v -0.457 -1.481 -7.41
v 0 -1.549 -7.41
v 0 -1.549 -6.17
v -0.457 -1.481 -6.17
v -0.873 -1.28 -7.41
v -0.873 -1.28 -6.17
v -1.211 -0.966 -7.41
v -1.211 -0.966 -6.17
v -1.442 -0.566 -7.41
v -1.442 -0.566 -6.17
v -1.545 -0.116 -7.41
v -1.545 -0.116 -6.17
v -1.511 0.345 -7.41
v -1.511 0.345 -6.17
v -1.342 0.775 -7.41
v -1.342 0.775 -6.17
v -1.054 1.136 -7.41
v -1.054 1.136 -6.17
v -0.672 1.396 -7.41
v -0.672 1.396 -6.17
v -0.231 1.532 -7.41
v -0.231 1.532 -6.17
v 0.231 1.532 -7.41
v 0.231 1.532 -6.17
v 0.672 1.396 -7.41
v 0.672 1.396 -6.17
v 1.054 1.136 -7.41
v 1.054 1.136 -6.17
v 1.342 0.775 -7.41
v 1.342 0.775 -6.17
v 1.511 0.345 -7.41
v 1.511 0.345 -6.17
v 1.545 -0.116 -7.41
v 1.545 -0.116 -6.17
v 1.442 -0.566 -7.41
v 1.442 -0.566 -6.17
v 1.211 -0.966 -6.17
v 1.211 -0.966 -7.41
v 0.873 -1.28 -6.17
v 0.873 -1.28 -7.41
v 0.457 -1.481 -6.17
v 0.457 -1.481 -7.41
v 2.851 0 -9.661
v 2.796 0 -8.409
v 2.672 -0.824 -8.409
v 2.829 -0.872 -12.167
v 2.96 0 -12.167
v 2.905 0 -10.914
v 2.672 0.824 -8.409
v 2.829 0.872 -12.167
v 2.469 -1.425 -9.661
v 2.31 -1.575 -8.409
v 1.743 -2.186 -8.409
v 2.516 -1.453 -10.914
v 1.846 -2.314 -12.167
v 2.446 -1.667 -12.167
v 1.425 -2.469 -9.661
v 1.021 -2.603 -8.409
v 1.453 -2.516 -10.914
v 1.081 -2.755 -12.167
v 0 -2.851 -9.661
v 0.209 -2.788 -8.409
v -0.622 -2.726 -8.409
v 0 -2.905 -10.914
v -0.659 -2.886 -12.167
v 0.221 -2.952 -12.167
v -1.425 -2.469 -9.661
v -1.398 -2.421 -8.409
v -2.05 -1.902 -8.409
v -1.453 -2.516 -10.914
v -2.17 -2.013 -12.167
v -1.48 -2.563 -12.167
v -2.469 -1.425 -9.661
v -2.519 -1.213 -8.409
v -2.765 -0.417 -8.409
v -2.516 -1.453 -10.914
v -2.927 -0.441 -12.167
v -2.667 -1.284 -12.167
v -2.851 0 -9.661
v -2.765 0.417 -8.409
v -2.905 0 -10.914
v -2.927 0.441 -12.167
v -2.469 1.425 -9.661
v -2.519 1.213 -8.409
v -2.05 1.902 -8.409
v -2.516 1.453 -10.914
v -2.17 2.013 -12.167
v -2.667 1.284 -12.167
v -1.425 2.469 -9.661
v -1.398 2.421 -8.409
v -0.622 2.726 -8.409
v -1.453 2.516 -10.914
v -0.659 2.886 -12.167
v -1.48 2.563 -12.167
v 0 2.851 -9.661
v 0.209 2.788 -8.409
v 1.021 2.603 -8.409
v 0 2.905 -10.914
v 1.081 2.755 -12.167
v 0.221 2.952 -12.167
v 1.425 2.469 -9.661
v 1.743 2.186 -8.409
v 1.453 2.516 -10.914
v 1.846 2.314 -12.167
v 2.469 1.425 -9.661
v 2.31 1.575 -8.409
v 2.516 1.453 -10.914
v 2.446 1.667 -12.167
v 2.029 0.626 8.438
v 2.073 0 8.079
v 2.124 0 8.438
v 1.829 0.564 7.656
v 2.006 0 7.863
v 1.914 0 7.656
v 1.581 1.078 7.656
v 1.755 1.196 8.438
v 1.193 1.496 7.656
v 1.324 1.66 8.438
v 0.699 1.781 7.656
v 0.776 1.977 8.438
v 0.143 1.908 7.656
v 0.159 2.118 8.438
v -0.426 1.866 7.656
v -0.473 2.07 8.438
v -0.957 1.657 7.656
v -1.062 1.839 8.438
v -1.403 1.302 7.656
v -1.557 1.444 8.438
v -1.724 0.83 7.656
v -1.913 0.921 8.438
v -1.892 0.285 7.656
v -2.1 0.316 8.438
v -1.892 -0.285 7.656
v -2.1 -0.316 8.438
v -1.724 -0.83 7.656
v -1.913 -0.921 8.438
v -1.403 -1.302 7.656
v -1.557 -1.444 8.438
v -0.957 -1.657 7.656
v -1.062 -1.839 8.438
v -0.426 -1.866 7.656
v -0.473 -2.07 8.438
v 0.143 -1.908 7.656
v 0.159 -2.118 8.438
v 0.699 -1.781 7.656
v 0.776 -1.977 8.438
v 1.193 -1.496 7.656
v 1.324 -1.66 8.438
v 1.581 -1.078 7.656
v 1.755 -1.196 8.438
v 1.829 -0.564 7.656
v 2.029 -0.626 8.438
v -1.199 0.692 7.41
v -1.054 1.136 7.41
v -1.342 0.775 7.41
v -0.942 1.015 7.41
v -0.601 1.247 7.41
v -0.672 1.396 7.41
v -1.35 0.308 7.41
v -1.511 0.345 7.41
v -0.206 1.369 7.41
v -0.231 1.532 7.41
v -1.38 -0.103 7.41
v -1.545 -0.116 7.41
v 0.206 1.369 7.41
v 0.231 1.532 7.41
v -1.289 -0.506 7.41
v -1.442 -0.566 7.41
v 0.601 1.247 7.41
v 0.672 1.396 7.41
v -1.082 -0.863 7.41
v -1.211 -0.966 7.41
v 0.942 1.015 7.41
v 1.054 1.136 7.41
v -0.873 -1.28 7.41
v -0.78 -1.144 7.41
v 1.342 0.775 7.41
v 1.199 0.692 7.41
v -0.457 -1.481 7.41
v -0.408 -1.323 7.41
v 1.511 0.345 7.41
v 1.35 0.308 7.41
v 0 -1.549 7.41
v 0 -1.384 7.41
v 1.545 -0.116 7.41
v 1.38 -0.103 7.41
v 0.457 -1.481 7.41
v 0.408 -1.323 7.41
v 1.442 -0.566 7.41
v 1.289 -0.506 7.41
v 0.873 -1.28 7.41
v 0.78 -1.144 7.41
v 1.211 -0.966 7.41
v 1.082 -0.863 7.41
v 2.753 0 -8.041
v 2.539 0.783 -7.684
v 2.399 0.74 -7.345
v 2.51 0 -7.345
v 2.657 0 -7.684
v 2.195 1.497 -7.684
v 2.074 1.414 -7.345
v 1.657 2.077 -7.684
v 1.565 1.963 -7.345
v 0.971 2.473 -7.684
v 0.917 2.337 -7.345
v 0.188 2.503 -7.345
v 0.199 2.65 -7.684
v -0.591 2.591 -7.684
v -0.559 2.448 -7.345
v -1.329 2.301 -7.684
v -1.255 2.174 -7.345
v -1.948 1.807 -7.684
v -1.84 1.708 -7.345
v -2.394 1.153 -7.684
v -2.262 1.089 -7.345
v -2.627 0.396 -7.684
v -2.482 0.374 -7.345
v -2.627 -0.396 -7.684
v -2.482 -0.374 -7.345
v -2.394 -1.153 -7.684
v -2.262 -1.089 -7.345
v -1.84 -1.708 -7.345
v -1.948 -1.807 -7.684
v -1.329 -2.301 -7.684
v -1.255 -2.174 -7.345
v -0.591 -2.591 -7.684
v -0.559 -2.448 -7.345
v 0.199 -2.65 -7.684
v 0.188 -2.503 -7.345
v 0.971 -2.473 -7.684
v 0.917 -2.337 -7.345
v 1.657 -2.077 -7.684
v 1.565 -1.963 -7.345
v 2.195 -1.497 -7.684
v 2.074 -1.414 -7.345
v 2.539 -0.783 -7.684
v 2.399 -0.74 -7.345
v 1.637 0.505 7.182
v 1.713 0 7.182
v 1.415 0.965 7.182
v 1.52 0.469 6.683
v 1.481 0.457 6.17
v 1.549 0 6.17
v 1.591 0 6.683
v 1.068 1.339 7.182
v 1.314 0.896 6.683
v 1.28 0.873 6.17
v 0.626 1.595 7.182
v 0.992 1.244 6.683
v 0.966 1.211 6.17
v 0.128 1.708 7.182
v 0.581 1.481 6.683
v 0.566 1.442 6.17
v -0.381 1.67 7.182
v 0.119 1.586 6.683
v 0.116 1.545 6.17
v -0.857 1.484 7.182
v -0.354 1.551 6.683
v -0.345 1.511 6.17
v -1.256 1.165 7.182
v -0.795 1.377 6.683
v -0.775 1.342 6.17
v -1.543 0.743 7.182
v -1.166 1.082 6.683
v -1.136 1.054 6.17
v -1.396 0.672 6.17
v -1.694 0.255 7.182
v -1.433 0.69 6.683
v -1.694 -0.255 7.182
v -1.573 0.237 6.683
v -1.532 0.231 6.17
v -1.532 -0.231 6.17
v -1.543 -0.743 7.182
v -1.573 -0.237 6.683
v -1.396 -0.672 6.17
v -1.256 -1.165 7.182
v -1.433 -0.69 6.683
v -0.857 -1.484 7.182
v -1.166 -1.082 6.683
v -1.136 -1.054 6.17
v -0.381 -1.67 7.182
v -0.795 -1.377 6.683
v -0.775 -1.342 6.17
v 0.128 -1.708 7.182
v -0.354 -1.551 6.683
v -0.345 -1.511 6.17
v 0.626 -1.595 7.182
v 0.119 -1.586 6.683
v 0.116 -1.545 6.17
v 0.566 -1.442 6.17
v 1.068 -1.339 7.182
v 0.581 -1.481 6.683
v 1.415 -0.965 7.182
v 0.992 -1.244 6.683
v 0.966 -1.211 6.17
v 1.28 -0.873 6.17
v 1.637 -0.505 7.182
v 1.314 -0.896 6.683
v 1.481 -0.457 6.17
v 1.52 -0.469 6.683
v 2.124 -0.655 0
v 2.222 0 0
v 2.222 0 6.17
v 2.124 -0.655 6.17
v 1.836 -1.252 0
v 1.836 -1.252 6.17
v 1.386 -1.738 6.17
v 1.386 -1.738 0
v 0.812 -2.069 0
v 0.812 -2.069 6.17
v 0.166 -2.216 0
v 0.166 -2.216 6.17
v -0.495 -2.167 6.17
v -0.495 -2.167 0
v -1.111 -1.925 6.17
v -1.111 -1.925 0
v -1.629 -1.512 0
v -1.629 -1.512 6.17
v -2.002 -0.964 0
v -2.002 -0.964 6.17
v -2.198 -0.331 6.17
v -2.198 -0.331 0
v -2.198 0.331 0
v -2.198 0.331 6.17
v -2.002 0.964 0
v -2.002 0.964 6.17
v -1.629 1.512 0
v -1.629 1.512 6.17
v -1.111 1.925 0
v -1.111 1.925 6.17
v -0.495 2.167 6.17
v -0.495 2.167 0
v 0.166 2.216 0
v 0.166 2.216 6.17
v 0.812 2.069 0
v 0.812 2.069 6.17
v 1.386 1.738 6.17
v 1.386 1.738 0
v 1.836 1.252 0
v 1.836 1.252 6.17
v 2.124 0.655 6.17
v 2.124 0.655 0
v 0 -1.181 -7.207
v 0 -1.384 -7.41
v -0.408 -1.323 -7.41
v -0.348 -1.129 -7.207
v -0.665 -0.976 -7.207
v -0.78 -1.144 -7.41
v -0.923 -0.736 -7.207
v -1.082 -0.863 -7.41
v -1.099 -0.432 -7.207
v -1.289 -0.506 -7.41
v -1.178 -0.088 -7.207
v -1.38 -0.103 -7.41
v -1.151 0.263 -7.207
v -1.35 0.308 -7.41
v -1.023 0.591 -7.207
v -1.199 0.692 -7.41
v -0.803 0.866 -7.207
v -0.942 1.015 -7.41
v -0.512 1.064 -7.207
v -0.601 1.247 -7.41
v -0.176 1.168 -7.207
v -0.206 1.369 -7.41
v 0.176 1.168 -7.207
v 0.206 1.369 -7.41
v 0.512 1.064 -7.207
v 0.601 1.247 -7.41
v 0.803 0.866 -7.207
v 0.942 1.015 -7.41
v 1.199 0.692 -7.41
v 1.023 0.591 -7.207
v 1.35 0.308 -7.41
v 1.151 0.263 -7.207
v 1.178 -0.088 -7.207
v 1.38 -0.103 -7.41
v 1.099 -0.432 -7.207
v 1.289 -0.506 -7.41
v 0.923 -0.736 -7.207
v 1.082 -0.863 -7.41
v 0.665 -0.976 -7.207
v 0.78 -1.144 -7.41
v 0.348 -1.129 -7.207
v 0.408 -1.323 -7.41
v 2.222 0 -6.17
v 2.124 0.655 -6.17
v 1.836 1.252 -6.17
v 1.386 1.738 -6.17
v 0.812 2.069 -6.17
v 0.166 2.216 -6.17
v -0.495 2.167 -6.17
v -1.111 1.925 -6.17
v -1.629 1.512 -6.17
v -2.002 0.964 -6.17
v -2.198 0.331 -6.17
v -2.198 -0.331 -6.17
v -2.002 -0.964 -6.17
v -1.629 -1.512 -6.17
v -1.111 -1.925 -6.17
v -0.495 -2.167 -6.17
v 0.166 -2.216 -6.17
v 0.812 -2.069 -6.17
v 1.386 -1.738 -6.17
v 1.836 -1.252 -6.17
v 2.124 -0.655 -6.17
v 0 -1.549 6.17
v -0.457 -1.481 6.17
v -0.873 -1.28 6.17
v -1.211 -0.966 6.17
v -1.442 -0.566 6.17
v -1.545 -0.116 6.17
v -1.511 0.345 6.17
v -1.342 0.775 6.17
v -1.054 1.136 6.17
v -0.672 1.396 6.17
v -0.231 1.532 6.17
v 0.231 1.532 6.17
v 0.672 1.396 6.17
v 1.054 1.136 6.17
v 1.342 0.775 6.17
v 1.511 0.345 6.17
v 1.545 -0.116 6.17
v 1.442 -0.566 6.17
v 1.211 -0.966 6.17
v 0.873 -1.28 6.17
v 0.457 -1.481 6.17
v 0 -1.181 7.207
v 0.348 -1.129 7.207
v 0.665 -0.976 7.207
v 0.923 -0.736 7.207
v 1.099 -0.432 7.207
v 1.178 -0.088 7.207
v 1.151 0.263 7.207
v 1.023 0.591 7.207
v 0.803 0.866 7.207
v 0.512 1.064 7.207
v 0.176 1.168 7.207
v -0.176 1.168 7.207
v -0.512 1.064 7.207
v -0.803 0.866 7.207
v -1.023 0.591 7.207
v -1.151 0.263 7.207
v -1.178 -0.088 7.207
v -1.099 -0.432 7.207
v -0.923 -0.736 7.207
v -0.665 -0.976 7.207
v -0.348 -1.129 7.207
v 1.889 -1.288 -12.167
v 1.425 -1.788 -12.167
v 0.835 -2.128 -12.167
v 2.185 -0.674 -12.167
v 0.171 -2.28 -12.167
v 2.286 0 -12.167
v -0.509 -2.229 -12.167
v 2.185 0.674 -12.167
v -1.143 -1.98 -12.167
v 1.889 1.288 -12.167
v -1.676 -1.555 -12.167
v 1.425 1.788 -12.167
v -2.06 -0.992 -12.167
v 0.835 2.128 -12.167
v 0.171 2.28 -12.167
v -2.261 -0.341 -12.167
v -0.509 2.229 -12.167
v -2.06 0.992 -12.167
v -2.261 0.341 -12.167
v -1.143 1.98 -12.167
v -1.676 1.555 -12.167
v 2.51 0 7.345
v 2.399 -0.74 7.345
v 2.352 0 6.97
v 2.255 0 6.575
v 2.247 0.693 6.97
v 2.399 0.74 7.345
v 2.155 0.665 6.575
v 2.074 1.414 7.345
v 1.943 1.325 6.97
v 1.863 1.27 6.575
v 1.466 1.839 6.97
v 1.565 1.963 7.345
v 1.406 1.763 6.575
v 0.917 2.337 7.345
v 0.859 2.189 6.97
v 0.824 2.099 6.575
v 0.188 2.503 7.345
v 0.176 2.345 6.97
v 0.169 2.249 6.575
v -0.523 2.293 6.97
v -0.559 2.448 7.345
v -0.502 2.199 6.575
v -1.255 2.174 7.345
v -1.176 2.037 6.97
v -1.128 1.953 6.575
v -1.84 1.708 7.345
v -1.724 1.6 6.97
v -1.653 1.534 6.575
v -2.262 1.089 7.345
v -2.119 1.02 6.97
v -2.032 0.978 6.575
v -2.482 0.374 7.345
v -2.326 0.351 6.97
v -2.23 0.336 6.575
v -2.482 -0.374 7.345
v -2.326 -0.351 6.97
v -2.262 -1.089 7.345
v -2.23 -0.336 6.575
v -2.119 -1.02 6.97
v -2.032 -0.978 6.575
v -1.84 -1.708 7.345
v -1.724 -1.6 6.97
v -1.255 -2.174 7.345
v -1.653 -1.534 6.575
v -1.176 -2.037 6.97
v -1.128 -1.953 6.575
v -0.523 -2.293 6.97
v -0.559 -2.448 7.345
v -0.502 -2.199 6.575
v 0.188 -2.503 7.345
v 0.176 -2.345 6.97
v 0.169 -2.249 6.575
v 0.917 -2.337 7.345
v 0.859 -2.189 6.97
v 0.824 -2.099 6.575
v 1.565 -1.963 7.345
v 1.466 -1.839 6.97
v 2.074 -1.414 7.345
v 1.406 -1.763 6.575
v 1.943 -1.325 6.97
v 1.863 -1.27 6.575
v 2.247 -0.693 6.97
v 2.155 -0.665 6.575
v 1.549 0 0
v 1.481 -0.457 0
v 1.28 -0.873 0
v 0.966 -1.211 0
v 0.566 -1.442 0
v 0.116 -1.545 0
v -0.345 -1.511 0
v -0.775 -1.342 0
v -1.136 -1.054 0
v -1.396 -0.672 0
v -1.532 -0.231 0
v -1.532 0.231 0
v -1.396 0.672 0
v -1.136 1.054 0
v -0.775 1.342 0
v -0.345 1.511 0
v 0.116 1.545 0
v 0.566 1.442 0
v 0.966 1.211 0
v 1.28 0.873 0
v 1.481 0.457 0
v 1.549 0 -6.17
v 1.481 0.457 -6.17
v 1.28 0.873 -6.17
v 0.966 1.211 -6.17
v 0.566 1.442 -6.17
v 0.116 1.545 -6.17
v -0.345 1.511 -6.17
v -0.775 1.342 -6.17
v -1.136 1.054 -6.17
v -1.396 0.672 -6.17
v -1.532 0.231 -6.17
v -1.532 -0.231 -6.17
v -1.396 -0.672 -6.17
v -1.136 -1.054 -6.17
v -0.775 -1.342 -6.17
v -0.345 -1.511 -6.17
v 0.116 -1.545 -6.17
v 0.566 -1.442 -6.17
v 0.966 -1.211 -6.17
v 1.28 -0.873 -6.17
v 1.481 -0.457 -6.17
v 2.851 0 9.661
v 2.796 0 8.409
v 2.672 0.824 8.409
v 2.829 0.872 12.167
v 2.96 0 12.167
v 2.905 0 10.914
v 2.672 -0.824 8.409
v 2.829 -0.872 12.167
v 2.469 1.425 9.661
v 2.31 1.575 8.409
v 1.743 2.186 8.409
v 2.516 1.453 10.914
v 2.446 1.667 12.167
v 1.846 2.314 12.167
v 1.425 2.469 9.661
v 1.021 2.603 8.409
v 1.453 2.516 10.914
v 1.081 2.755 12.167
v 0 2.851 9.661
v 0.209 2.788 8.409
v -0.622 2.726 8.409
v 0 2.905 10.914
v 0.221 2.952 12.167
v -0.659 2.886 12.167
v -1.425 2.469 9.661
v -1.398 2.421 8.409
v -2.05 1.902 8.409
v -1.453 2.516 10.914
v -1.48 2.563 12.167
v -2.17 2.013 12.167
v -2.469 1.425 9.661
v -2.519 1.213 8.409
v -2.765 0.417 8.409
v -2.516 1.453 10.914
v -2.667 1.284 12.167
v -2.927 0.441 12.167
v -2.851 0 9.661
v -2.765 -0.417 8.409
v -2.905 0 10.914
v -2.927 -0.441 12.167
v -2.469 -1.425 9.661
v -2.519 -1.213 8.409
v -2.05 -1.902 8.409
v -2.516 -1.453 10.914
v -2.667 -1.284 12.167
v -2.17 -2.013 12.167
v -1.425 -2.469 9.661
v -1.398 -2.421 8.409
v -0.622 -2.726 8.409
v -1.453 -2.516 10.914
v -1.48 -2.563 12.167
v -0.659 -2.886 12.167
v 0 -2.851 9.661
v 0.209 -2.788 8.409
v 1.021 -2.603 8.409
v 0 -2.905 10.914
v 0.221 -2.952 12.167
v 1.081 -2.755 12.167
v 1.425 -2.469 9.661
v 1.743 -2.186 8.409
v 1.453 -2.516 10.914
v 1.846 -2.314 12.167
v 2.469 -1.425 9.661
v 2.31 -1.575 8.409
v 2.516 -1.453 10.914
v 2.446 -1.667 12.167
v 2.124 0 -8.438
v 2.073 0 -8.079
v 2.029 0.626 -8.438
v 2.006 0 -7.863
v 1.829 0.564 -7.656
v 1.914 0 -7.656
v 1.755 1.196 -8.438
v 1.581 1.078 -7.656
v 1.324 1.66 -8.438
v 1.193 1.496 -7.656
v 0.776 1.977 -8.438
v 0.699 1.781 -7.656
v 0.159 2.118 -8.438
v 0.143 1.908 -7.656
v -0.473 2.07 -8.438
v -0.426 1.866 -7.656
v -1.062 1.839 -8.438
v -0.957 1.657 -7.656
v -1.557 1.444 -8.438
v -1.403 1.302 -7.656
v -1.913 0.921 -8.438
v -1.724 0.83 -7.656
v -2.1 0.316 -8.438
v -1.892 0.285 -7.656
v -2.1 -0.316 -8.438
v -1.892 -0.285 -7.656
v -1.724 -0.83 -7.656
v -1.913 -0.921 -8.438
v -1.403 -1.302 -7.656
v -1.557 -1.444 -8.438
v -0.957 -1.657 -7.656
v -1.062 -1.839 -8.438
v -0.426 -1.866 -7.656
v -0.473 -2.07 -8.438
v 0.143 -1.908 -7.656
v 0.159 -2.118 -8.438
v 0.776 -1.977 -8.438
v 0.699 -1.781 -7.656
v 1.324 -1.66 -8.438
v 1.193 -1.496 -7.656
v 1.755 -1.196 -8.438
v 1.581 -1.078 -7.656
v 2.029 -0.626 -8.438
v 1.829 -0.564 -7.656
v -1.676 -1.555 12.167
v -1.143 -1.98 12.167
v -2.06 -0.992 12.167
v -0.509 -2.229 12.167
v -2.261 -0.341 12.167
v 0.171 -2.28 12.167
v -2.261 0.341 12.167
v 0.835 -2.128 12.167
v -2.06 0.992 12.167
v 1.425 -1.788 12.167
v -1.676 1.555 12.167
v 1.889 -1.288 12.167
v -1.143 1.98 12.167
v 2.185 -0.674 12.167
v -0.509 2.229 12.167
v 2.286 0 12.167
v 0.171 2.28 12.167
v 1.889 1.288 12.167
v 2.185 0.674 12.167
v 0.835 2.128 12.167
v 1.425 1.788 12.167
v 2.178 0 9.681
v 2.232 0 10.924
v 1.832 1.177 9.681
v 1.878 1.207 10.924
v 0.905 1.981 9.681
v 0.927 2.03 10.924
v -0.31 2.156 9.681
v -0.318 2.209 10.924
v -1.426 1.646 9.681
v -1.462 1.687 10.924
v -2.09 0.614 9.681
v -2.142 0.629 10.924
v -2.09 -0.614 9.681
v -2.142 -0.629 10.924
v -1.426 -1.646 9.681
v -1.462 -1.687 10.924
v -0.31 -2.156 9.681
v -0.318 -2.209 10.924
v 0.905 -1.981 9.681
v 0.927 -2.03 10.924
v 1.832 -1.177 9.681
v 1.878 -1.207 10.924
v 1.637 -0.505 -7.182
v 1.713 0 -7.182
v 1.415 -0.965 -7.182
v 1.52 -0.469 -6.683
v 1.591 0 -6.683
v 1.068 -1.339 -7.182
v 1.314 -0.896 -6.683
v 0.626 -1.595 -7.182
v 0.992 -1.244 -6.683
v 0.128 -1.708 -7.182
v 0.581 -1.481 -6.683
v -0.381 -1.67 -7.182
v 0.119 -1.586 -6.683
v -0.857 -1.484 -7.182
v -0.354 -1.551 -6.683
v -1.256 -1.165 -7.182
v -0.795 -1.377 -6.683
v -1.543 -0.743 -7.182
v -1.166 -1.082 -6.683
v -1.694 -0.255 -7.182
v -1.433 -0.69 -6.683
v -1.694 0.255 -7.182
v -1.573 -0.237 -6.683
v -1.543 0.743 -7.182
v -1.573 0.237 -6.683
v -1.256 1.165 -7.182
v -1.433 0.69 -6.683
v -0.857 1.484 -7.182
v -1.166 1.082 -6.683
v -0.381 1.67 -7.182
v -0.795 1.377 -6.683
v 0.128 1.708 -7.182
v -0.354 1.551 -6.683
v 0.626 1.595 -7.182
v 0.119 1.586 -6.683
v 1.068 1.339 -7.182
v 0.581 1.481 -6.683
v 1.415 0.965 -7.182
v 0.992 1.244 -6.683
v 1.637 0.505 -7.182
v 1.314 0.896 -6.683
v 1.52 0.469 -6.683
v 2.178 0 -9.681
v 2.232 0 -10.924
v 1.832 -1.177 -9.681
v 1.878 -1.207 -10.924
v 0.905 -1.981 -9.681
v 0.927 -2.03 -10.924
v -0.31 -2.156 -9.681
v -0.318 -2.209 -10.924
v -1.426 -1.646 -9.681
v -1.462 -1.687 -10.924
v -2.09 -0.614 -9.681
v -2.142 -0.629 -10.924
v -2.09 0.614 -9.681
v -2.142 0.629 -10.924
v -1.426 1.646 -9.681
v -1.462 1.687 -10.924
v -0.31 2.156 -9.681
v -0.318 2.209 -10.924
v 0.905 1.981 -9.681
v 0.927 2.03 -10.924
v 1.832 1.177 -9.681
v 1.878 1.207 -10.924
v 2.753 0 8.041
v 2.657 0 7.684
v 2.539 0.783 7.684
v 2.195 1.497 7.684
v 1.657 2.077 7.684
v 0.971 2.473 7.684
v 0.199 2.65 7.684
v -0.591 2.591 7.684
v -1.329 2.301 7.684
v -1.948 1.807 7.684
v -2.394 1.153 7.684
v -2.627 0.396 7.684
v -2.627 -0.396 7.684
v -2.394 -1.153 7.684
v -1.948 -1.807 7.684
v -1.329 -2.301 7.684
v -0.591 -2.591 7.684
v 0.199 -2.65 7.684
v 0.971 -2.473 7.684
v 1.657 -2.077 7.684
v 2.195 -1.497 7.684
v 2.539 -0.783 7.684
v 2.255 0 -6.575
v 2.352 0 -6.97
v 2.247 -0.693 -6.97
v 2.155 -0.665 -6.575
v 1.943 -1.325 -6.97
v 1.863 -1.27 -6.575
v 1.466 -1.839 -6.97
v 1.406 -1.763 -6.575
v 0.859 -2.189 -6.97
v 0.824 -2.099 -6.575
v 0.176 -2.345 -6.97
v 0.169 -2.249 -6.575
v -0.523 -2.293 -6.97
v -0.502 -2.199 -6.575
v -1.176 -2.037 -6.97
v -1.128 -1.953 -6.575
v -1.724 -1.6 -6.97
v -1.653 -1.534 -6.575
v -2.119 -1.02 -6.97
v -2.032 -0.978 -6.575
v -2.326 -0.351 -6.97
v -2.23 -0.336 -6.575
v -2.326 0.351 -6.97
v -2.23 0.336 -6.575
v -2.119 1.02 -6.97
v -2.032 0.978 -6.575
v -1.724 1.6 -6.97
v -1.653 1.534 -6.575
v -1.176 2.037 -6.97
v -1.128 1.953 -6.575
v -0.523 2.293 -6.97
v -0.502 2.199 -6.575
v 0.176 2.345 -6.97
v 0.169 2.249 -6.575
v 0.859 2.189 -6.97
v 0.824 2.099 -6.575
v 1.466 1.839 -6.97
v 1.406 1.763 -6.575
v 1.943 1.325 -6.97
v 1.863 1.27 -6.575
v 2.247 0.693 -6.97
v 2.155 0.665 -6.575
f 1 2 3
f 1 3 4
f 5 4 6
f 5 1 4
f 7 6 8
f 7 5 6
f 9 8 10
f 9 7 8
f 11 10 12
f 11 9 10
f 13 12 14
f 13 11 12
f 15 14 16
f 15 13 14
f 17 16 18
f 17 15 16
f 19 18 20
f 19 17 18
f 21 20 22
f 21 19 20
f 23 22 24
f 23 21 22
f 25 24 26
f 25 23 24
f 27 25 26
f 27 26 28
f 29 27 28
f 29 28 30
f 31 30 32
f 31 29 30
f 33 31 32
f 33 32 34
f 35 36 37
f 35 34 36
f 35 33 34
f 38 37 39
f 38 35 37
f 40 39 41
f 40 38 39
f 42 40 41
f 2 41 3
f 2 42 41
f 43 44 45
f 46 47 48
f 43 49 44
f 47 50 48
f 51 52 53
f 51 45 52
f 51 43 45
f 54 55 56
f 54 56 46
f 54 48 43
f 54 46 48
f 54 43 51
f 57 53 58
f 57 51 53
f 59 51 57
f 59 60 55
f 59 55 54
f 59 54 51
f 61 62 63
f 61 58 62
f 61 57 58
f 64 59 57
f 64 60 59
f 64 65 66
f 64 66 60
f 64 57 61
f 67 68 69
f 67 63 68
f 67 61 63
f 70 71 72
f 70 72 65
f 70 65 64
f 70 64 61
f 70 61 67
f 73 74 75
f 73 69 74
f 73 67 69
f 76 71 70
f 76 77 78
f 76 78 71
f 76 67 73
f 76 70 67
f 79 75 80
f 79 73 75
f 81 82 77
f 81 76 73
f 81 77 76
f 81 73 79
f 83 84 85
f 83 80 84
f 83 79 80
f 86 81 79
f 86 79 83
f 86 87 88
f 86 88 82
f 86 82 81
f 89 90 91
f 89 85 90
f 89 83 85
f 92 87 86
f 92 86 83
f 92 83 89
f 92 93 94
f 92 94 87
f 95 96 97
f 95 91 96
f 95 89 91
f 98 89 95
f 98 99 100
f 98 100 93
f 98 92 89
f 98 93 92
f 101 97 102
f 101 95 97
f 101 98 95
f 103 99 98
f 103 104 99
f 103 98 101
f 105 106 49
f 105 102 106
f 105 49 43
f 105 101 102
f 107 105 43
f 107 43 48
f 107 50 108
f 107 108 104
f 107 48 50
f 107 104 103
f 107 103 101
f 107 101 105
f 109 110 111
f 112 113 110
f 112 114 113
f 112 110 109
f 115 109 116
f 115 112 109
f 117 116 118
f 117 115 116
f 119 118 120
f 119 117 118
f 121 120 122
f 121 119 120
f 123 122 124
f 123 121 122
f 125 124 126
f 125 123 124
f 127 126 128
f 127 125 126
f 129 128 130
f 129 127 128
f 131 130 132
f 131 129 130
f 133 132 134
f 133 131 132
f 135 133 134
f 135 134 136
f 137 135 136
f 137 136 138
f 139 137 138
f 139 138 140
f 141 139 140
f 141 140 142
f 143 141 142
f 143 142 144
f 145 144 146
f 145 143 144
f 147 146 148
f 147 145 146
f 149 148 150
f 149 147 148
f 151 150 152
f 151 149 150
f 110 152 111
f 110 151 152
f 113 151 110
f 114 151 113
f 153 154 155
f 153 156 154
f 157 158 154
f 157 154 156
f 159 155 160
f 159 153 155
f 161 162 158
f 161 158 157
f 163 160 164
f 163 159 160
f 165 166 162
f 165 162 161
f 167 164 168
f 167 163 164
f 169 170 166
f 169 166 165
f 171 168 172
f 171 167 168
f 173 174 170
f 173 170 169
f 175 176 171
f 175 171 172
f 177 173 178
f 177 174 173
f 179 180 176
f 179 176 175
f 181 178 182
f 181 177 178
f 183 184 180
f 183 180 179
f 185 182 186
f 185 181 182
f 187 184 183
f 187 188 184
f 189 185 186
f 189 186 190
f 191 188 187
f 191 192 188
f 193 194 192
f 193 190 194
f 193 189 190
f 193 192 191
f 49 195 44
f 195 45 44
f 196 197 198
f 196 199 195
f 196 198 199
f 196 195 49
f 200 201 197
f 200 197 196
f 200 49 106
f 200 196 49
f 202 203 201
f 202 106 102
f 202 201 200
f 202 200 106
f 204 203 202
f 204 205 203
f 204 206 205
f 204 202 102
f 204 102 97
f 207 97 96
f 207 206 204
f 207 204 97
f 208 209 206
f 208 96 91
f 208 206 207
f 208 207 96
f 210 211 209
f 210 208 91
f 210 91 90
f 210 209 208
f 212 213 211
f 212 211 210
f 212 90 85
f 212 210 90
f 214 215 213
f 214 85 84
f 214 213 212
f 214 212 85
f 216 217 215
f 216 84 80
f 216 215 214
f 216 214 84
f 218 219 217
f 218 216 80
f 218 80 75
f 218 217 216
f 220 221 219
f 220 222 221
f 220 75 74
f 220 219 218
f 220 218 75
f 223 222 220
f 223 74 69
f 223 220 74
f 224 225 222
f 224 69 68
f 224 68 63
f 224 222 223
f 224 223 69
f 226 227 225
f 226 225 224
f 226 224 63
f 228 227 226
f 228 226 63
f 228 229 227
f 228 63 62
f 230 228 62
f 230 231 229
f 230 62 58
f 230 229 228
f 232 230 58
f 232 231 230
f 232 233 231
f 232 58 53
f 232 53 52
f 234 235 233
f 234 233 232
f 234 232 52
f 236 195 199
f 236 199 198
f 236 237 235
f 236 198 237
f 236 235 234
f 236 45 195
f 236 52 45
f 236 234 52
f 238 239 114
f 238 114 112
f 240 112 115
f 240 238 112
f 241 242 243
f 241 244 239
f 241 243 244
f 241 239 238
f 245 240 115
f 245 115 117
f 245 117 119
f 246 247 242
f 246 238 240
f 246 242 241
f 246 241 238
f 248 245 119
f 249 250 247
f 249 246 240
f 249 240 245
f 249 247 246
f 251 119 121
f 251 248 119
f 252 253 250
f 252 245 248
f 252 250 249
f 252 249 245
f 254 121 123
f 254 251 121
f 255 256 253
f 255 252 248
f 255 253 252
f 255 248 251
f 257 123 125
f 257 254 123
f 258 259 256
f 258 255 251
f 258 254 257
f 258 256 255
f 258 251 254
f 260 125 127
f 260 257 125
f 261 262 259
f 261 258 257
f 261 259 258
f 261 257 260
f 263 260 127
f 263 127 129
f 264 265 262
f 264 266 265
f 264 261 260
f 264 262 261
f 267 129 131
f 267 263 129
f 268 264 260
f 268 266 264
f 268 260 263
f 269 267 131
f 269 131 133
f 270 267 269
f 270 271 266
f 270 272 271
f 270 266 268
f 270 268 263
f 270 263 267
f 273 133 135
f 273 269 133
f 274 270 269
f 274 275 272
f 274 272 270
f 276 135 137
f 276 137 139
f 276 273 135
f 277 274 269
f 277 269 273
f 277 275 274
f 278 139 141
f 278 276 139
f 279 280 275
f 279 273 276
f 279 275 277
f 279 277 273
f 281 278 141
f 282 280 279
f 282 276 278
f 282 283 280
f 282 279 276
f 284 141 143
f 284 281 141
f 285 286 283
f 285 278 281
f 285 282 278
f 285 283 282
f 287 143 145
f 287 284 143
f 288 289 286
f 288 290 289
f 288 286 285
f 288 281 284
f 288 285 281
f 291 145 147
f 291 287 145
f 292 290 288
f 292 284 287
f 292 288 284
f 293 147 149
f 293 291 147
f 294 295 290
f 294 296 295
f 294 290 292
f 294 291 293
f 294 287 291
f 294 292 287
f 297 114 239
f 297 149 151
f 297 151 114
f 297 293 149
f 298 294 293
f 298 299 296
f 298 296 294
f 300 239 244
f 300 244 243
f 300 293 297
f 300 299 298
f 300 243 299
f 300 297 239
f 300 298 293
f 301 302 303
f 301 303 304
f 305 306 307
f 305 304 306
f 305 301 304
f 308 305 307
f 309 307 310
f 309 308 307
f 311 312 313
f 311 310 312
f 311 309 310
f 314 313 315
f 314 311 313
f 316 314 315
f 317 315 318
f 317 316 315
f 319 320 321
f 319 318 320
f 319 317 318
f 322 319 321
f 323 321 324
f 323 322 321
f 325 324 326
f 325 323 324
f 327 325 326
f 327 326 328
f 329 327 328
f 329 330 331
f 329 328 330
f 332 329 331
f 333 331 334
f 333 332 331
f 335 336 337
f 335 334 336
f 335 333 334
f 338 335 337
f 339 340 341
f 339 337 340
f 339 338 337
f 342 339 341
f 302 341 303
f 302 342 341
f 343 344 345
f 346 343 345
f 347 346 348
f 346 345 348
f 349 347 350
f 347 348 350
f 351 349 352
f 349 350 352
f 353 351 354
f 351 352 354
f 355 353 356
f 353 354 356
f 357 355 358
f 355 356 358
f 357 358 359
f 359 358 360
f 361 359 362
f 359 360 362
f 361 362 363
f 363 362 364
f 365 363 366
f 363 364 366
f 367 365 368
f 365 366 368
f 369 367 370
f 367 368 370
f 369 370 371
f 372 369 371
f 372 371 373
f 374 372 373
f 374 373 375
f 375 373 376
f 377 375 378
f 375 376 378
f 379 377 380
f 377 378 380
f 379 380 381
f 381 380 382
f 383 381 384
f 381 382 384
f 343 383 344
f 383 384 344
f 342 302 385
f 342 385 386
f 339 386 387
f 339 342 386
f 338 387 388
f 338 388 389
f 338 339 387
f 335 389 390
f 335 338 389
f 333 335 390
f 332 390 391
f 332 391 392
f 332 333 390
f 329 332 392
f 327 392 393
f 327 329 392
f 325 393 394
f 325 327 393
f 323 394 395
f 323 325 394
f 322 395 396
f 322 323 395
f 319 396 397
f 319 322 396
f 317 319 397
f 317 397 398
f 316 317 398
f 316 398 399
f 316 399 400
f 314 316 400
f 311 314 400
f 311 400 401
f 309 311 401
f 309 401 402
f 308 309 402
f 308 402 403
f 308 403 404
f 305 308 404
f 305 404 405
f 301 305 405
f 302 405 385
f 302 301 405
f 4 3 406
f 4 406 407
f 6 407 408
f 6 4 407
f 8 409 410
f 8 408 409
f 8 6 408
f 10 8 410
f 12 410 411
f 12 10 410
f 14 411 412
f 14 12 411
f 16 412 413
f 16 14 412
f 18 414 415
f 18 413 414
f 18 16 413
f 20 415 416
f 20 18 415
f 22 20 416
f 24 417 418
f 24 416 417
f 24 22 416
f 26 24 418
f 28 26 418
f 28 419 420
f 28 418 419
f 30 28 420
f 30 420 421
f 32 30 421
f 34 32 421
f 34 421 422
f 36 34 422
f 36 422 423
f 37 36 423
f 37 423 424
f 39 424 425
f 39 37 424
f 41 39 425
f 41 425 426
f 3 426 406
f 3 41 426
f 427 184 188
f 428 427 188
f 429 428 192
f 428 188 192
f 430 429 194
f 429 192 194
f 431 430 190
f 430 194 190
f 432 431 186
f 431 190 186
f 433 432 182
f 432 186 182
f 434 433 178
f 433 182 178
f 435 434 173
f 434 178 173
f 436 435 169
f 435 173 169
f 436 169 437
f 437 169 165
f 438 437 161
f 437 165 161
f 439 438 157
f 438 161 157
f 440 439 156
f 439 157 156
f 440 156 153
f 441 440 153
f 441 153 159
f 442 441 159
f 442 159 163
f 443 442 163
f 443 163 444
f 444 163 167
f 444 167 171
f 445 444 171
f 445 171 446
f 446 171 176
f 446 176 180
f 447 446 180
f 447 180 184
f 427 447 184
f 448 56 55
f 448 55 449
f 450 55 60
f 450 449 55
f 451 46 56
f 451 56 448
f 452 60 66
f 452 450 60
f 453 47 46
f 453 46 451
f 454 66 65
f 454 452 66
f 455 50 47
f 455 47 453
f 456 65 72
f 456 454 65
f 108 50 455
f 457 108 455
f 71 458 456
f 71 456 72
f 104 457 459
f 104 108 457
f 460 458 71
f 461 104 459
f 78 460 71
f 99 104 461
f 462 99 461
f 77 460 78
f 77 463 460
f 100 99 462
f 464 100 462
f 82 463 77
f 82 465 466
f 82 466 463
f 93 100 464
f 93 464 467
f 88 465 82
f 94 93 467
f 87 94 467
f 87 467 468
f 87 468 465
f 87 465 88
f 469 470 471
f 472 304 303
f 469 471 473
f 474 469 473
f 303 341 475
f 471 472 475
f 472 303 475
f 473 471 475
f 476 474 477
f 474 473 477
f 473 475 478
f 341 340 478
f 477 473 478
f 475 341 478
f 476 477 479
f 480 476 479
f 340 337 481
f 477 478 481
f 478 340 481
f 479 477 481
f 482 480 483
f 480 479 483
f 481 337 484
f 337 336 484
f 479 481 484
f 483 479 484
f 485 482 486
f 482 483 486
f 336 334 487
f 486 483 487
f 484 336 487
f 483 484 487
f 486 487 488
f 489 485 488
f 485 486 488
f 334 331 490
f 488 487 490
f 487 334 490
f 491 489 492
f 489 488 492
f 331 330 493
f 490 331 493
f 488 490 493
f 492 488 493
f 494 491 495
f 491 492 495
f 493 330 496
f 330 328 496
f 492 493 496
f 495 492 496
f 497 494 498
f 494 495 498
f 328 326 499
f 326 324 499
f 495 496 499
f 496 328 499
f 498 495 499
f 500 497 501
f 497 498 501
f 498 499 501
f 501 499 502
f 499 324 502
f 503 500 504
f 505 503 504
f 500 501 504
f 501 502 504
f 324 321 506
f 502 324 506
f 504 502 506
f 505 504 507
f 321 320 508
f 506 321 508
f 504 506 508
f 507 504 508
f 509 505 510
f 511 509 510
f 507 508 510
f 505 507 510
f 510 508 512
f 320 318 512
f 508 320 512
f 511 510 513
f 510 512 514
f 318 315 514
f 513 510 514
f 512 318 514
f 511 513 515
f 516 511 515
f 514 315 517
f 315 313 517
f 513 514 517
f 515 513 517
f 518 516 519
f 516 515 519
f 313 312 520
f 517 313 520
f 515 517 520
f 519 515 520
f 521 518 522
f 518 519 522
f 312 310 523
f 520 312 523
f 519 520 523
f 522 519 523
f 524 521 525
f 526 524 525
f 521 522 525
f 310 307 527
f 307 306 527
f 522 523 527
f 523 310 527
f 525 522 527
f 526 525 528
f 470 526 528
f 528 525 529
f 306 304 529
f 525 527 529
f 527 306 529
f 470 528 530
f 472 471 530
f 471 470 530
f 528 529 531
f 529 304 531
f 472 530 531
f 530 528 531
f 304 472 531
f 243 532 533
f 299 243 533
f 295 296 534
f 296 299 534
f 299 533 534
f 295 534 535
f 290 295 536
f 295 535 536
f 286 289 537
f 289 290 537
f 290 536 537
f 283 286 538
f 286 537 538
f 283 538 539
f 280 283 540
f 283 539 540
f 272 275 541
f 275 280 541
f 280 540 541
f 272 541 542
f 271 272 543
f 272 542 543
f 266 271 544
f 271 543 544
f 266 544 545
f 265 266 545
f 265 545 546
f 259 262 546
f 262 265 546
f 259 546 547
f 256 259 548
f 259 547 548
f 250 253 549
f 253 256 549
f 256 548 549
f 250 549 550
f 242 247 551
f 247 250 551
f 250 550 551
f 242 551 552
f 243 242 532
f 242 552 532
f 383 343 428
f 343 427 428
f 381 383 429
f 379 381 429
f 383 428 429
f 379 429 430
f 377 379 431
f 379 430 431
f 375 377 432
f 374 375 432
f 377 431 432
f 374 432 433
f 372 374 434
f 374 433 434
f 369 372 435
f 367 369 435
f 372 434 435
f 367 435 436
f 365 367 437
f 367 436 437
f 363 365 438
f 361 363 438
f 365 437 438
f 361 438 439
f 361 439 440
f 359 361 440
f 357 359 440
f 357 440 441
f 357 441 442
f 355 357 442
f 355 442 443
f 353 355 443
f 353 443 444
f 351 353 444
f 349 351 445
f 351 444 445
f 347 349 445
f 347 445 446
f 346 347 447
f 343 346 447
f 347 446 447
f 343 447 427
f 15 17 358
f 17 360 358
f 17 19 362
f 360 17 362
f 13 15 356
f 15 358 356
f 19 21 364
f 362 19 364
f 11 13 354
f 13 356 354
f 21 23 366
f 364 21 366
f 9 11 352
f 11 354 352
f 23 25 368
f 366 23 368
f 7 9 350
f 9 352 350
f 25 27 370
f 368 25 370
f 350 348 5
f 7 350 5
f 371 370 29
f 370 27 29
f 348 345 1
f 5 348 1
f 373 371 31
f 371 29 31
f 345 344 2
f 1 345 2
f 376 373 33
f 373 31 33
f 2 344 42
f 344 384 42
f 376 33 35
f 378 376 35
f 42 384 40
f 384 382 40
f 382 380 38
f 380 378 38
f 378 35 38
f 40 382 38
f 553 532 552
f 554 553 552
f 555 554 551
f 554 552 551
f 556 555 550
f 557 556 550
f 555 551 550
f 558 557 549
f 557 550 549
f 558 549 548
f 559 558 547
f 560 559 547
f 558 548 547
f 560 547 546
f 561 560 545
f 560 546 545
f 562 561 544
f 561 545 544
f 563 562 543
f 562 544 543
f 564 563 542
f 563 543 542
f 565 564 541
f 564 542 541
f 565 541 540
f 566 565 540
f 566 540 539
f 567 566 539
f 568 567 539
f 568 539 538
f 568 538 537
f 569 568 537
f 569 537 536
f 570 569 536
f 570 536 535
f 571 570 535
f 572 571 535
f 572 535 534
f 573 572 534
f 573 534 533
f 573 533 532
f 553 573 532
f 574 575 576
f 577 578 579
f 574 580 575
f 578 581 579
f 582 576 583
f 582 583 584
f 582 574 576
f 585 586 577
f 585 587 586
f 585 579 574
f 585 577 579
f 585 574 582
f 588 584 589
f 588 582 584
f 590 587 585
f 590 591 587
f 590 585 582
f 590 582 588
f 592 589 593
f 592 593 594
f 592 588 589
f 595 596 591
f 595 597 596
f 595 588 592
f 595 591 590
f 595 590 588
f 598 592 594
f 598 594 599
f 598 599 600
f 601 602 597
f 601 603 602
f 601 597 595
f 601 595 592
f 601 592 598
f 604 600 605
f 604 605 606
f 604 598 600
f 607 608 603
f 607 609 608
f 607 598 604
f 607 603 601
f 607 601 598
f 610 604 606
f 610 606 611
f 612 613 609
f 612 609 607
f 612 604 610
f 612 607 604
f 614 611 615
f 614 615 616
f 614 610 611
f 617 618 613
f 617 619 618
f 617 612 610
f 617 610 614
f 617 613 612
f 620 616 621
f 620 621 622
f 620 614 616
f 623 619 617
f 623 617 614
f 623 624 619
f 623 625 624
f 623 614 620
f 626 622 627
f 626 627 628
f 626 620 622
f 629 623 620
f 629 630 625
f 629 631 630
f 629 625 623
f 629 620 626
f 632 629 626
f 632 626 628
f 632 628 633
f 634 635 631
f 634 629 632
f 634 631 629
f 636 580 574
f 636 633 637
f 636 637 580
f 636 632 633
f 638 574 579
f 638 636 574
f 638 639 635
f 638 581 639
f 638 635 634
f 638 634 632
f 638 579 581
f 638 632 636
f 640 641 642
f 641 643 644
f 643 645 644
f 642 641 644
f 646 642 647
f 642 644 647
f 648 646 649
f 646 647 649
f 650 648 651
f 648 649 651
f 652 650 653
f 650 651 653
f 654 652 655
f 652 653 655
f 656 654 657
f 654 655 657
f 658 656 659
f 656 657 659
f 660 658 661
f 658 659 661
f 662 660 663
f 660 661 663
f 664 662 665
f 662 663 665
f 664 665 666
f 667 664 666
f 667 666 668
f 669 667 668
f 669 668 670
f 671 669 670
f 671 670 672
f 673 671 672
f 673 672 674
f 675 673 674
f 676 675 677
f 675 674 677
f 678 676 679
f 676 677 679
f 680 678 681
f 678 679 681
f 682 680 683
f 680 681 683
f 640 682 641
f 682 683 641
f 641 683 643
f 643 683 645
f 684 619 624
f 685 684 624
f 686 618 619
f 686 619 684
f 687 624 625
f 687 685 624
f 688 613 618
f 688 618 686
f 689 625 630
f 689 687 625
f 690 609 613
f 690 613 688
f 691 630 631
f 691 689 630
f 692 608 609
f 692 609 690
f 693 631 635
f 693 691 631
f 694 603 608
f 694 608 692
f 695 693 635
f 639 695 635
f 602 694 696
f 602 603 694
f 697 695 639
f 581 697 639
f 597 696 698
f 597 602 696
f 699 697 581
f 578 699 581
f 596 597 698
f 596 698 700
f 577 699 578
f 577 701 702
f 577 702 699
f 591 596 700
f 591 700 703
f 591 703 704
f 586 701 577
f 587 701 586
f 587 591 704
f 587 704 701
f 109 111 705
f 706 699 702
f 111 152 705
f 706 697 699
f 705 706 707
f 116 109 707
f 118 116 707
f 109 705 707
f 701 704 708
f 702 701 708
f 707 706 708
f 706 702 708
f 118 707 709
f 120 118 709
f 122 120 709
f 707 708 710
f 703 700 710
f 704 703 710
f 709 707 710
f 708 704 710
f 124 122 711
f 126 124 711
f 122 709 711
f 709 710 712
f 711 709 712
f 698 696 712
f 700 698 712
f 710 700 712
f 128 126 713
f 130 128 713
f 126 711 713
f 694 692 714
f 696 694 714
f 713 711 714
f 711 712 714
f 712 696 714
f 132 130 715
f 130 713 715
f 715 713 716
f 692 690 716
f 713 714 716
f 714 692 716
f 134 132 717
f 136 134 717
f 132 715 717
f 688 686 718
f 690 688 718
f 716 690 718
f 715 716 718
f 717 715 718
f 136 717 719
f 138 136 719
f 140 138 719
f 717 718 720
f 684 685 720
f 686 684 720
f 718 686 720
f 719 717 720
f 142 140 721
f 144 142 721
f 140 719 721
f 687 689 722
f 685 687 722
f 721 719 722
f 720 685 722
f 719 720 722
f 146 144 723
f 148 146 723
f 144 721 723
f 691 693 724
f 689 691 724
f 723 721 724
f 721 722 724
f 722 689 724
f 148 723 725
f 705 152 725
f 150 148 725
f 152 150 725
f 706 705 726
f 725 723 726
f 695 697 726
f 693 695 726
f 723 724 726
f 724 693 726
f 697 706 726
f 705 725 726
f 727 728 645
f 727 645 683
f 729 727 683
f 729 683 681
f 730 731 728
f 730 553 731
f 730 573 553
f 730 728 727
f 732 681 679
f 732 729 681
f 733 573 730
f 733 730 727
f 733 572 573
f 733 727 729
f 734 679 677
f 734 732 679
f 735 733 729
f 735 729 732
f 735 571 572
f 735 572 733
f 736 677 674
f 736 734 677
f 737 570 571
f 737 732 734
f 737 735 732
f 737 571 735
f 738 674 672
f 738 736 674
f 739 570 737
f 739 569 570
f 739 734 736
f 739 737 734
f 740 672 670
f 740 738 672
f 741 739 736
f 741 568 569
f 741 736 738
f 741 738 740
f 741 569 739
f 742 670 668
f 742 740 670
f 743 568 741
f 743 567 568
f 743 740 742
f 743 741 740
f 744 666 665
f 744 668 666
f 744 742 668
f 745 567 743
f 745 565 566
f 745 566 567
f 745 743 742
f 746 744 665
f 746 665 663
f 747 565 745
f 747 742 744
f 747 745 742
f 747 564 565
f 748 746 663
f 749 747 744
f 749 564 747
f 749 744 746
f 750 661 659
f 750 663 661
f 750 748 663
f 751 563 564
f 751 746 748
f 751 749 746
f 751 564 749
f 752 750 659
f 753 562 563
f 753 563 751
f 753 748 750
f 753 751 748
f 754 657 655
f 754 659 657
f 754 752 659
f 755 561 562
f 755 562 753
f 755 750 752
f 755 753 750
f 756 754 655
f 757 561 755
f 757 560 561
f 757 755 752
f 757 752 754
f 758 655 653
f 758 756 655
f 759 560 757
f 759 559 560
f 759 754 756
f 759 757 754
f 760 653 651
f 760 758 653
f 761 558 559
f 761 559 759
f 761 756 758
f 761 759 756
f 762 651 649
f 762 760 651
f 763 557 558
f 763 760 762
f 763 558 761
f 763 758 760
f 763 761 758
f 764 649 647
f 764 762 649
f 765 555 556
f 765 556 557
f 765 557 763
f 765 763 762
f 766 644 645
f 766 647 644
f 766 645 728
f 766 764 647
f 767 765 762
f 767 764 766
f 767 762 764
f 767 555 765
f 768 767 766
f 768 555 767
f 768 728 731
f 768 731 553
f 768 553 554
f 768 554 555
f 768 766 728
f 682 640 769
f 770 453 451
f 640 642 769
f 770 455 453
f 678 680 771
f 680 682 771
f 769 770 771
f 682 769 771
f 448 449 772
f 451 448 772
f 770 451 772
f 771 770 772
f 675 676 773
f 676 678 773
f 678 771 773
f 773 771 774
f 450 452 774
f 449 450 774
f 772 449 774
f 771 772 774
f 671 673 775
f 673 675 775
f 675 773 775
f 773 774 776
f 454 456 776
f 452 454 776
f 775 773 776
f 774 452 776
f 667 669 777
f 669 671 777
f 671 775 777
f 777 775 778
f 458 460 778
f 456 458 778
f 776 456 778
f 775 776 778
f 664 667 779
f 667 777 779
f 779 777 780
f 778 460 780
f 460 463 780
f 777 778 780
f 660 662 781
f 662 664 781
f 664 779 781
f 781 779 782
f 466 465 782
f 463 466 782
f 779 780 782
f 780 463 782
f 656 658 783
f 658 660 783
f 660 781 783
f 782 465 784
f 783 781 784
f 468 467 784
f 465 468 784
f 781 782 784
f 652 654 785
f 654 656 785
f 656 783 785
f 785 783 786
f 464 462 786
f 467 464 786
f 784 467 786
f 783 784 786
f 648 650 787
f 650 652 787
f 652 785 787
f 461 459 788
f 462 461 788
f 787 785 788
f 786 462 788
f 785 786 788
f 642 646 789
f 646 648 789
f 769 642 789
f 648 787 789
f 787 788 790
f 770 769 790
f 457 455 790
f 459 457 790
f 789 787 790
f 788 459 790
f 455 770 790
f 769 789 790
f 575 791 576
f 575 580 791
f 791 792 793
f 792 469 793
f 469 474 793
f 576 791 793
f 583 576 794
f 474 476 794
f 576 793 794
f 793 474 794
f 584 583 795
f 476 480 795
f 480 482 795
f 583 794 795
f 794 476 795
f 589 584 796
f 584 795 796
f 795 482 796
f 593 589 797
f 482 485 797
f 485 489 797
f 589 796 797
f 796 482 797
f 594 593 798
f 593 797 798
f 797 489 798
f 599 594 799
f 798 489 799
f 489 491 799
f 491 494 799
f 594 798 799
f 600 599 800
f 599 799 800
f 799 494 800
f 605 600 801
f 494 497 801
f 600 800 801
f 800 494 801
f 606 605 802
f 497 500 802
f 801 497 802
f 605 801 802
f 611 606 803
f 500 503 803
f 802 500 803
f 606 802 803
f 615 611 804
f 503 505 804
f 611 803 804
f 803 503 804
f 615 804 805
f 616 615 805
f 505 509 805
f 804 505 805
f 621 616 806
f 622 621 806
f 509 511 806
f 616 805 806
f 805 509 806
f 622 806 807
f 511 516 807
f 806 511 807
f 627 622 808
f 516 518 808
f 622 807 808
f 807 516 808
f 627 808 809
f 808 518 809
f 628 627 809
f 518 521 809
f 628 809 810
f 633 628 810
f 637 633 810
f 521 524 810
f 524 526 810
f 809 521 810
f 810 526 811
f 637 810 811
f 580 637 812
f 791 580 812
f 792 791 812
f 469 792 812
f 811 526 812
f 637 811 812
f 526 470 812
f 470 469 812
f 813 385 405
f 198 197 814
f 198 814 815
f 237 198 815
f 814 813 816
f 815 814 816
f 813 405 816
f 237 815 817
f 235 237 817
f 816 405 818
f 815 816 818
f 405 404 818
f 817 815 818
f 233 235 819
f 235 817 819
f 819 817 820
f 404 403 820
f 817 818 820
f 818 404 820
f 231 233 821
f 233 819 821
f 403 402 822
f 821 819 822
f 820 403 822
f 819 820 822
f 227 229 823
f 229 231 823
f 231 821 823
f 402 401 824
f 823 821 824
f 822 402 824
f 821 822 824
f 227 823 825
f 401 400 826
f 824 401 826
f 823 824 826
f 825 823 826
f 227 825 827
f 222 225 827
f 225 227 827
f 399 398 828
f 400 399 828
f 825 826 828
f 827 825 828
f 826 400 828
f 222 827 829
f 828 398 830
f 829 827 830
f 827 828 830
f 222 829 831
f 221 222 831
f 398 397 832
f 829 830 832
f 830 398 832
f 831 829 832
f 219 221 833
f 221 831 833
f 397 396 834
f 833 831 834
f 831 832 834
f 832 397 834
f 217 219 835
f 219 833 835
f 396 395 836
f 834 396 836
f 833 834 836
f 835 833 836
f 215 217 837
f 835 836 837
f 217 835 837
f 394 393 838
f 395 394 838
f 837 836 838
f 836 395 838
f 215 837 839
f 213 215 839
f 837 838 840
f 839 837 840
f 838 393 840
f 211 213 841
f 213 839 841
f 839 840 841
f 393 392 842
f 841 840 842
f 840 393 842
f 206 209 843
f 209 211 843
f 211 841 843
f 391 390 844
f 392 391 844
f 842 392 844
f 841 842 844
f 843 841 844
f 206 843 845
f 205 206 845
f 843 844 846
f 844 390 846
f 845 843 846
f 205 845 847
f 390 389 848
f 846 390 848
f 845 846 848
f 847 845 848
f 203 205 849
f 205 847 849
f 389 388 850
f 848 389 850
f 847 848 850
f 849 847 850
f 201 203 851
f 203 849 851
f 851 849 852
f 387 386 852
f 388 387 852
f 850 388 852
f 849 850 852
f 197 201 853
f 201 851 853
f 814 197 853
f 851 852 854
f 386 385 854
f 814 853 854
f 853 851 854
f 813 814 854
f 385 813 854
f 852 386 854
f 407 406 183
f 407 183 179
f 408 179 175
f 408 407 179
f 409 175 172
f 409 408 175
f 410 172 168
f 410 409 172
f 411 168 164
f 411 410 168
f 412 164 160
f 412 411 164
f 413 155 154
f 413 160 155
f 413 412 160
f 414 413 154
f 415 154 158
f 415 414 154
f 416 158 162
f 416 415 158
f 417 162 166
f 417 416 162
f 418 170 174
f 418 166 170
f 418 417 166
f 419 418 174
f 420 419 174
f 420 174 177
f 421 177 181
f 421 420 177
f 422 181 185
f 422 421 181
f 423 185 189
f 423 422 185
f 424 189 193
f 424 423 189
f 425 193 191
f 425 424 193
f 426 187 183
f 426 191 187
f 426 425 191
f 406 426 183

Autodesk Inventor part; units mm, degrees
ref_plane "YZ Plane" through (0, 0, 0) normal (1, 0, 0) x (0, 1, 0)
ref_plane "XZ Plane" through (0, 0, 0) normal (0, 1, 0) x (-1, 0, 0)
ref_plane "XY Plane" through (0, 0, 0) normal (0, 0, 1) x (1, 0, 0)
sketch "Sketch1" plane through (0, 0, 0) normal (0, 0, 1) x (1, 0, 0)
  circle A0 centre (0, 0) radius 2.2225
  dimension "d0" = 4.445
extrude "Extrusion1" add sketch "Sketch1" along normal mid plane 13.8176
sketch "Sketch4" plane through (0, 0, 6.9088) normal (0, 0, 1) x (1, 0, 0)
  circle A0 centre (0, 0) radius 2.7305
  dimension "d16" = 5.461
extrude "Extrusion3" add sketch "Sketch4" along normal blind 5.2578 draft 2.5
fillet "Fillet3" radius 2.54 2 edges at (-2.7305, 0, 6.9088) (-2.2225, 0, 6.9088)
mirror "Mirror2" about plane through (0, 0, 0) normal (0, 0, 1) of "Extrusion3", "Fillet3"
shell "Shell1" thickness 0.6731 removed faces 2 at (-0.7385, 0.6543, 12.1666) at (-0.7385, 0.6543, -12.1666)
sketch "Sketch3" plane through (0, 0, 0) normal (1, 0, 0) x (0, 1, 0)
  line L0 (-1.5494, -7.4105) -> (-1.1811, -7.4105)
  line L1 (-1.1811, -7.4105) -> (-1.1811, 7.4105)
  line L2 (-1.1811, 7.4105) -> (-1.5494, 7.4105)
  line L3 (-1.5494, 7.4105) -> (-1.5494, -7.4105)
  line L4 (0, -17.3088) -> (0, 17.3088) projected
  arc A0 (-2.5104, -7.3447) -> (-2.2225, -6.17) centre (-4.7625, -6.17) ccw projected
  line L5 (-2.2225, -6.17) -> (-2.2225, 6.17) projected
  arc A1 (-2.2225, 6.17) -> (-2.5104, 7.3447) centre (-4.7625, 6.17) ccw projected
  arc A2 (-2.796, 8.4086) -> (-2.5104, 7.3447) centre (-0.2584, 8.5194) ccw projected
  line L6 (-2.796, 8.4086) -> (-2.9601, 12.1666) projected
  line L7 (-2.9601, 12.1666) -> (-2.2863, 12.1666) projected
  line L8 (-2.2863, 12.1666) -> (-2.1235, 8.4379) projected
  arc A3 (-2.1235, 8.4379) -> (-1.9137, 7.656) centre (-0.2584, 8.5194) ccw projected
  arc A4 (-1.5494, 6.17) -> (-1.9137, 7.656) centre (-4.7625, 6.17) ccw projected
  line L9 (-1.5494, 6.17) -> (-1.5494, -6.17) projected
  arc A5 (-1.9137, -7.656) -> (-1.5494, -6.17) centre (-4.7625, -6.17) ccw projected
  arc A6 (-1.9137, -7.656) -> (-2.1235, -8.4379) centre (-0.2584, -8.5194) ccw projected
  line L10 (-2.1235, -8.4379) -> (-2.2863, -12.1666) projected
  line L11 (-2.2863, -12.1666) -> (-2.9601, -12.1666) projected
  line L12 (-2.9601, -12.1666) -> (-2.796, -8.4086) projected
  arc A7 (-2.5104, -7.3447) -> (-2.796, -8.4086) centre (-0.2584, -8.5194) ccw projected
  arc A8 (2.2225, -6.17) -> (2.5104, -7.3447) centre (4.7625, -6.17) ccw projected
  arc A9 (2.796, -8.4086) -> (2.5104, -7.3447) centre (0.2584, -8.5194) ccw projected
  line L13 (2.796, -8.4086) -> (2.9601, -12.1666) projected
  line L14 (2.9601, -12.1666) -> (2.2863, -12.1666) projected
  line L15 (2.2863, -12.1666) -> (2.1235, -8.4379) projected
  arc A10 (2.1235, -8.4379) -> (1.9137, -7.656) centre (0.2584, -8.5194) ccw projected
  arc A11 (1.5494, -6.17) -> (1.9137, -7.656) centre (4.7625, -6.17) ccw projected
  line L16 (1.5494, -6.17) -> (1.5494, 6.17) projected
  arc A12 (1.9137, 7.656) -> (1.5494, 6.17) centre (4.7625, 6.17) ccw projected
  arc A13 (1.9137, 7.656) -> (2.1235, 8.4379) centre (0.2584, 8.5194) ccw projected
  line L17 (2.1235, 8.4379) -> (2.2863, 12.1666) projected
  line L18 (2.2863, 12.1666) -> (2.9601, 12.1666) projected
  line L19 (2.9601, 12.1666) -> (2.796, 8.4086) projected
  arc A14 (2.5104, 7.3447) -> (2.796, 8.4086) centre (0.2584, 8.5194) ccw projected
  arc A15 (2.5104, 7.3447) -> (2.2225, 6.17) centre (4.7625, 6.17) ccw projected
  line L20 (2.2225, 6.17) -> (2.2225, -6.17) projected
  point P0 (0, 0)
  point P1 (-1.5494, 6.6485)
  point P2 (-1.5494, -6.6485)
  dimension "d9" = 0.3683
revolve "Revolution1" add sketch "Sketch3" angle 360 about axis through (0, 0, -10) along (0, 0, 1) separate body contours L3 L2 L1 L0
chamfer "Chamfer1" distance 0.2032 angle 45 2 edges at (0, 1.1811, 7.4105) (0, 1.1811, -7.4105)
properties part number "22-18 double sided female tube heat shrink red"
